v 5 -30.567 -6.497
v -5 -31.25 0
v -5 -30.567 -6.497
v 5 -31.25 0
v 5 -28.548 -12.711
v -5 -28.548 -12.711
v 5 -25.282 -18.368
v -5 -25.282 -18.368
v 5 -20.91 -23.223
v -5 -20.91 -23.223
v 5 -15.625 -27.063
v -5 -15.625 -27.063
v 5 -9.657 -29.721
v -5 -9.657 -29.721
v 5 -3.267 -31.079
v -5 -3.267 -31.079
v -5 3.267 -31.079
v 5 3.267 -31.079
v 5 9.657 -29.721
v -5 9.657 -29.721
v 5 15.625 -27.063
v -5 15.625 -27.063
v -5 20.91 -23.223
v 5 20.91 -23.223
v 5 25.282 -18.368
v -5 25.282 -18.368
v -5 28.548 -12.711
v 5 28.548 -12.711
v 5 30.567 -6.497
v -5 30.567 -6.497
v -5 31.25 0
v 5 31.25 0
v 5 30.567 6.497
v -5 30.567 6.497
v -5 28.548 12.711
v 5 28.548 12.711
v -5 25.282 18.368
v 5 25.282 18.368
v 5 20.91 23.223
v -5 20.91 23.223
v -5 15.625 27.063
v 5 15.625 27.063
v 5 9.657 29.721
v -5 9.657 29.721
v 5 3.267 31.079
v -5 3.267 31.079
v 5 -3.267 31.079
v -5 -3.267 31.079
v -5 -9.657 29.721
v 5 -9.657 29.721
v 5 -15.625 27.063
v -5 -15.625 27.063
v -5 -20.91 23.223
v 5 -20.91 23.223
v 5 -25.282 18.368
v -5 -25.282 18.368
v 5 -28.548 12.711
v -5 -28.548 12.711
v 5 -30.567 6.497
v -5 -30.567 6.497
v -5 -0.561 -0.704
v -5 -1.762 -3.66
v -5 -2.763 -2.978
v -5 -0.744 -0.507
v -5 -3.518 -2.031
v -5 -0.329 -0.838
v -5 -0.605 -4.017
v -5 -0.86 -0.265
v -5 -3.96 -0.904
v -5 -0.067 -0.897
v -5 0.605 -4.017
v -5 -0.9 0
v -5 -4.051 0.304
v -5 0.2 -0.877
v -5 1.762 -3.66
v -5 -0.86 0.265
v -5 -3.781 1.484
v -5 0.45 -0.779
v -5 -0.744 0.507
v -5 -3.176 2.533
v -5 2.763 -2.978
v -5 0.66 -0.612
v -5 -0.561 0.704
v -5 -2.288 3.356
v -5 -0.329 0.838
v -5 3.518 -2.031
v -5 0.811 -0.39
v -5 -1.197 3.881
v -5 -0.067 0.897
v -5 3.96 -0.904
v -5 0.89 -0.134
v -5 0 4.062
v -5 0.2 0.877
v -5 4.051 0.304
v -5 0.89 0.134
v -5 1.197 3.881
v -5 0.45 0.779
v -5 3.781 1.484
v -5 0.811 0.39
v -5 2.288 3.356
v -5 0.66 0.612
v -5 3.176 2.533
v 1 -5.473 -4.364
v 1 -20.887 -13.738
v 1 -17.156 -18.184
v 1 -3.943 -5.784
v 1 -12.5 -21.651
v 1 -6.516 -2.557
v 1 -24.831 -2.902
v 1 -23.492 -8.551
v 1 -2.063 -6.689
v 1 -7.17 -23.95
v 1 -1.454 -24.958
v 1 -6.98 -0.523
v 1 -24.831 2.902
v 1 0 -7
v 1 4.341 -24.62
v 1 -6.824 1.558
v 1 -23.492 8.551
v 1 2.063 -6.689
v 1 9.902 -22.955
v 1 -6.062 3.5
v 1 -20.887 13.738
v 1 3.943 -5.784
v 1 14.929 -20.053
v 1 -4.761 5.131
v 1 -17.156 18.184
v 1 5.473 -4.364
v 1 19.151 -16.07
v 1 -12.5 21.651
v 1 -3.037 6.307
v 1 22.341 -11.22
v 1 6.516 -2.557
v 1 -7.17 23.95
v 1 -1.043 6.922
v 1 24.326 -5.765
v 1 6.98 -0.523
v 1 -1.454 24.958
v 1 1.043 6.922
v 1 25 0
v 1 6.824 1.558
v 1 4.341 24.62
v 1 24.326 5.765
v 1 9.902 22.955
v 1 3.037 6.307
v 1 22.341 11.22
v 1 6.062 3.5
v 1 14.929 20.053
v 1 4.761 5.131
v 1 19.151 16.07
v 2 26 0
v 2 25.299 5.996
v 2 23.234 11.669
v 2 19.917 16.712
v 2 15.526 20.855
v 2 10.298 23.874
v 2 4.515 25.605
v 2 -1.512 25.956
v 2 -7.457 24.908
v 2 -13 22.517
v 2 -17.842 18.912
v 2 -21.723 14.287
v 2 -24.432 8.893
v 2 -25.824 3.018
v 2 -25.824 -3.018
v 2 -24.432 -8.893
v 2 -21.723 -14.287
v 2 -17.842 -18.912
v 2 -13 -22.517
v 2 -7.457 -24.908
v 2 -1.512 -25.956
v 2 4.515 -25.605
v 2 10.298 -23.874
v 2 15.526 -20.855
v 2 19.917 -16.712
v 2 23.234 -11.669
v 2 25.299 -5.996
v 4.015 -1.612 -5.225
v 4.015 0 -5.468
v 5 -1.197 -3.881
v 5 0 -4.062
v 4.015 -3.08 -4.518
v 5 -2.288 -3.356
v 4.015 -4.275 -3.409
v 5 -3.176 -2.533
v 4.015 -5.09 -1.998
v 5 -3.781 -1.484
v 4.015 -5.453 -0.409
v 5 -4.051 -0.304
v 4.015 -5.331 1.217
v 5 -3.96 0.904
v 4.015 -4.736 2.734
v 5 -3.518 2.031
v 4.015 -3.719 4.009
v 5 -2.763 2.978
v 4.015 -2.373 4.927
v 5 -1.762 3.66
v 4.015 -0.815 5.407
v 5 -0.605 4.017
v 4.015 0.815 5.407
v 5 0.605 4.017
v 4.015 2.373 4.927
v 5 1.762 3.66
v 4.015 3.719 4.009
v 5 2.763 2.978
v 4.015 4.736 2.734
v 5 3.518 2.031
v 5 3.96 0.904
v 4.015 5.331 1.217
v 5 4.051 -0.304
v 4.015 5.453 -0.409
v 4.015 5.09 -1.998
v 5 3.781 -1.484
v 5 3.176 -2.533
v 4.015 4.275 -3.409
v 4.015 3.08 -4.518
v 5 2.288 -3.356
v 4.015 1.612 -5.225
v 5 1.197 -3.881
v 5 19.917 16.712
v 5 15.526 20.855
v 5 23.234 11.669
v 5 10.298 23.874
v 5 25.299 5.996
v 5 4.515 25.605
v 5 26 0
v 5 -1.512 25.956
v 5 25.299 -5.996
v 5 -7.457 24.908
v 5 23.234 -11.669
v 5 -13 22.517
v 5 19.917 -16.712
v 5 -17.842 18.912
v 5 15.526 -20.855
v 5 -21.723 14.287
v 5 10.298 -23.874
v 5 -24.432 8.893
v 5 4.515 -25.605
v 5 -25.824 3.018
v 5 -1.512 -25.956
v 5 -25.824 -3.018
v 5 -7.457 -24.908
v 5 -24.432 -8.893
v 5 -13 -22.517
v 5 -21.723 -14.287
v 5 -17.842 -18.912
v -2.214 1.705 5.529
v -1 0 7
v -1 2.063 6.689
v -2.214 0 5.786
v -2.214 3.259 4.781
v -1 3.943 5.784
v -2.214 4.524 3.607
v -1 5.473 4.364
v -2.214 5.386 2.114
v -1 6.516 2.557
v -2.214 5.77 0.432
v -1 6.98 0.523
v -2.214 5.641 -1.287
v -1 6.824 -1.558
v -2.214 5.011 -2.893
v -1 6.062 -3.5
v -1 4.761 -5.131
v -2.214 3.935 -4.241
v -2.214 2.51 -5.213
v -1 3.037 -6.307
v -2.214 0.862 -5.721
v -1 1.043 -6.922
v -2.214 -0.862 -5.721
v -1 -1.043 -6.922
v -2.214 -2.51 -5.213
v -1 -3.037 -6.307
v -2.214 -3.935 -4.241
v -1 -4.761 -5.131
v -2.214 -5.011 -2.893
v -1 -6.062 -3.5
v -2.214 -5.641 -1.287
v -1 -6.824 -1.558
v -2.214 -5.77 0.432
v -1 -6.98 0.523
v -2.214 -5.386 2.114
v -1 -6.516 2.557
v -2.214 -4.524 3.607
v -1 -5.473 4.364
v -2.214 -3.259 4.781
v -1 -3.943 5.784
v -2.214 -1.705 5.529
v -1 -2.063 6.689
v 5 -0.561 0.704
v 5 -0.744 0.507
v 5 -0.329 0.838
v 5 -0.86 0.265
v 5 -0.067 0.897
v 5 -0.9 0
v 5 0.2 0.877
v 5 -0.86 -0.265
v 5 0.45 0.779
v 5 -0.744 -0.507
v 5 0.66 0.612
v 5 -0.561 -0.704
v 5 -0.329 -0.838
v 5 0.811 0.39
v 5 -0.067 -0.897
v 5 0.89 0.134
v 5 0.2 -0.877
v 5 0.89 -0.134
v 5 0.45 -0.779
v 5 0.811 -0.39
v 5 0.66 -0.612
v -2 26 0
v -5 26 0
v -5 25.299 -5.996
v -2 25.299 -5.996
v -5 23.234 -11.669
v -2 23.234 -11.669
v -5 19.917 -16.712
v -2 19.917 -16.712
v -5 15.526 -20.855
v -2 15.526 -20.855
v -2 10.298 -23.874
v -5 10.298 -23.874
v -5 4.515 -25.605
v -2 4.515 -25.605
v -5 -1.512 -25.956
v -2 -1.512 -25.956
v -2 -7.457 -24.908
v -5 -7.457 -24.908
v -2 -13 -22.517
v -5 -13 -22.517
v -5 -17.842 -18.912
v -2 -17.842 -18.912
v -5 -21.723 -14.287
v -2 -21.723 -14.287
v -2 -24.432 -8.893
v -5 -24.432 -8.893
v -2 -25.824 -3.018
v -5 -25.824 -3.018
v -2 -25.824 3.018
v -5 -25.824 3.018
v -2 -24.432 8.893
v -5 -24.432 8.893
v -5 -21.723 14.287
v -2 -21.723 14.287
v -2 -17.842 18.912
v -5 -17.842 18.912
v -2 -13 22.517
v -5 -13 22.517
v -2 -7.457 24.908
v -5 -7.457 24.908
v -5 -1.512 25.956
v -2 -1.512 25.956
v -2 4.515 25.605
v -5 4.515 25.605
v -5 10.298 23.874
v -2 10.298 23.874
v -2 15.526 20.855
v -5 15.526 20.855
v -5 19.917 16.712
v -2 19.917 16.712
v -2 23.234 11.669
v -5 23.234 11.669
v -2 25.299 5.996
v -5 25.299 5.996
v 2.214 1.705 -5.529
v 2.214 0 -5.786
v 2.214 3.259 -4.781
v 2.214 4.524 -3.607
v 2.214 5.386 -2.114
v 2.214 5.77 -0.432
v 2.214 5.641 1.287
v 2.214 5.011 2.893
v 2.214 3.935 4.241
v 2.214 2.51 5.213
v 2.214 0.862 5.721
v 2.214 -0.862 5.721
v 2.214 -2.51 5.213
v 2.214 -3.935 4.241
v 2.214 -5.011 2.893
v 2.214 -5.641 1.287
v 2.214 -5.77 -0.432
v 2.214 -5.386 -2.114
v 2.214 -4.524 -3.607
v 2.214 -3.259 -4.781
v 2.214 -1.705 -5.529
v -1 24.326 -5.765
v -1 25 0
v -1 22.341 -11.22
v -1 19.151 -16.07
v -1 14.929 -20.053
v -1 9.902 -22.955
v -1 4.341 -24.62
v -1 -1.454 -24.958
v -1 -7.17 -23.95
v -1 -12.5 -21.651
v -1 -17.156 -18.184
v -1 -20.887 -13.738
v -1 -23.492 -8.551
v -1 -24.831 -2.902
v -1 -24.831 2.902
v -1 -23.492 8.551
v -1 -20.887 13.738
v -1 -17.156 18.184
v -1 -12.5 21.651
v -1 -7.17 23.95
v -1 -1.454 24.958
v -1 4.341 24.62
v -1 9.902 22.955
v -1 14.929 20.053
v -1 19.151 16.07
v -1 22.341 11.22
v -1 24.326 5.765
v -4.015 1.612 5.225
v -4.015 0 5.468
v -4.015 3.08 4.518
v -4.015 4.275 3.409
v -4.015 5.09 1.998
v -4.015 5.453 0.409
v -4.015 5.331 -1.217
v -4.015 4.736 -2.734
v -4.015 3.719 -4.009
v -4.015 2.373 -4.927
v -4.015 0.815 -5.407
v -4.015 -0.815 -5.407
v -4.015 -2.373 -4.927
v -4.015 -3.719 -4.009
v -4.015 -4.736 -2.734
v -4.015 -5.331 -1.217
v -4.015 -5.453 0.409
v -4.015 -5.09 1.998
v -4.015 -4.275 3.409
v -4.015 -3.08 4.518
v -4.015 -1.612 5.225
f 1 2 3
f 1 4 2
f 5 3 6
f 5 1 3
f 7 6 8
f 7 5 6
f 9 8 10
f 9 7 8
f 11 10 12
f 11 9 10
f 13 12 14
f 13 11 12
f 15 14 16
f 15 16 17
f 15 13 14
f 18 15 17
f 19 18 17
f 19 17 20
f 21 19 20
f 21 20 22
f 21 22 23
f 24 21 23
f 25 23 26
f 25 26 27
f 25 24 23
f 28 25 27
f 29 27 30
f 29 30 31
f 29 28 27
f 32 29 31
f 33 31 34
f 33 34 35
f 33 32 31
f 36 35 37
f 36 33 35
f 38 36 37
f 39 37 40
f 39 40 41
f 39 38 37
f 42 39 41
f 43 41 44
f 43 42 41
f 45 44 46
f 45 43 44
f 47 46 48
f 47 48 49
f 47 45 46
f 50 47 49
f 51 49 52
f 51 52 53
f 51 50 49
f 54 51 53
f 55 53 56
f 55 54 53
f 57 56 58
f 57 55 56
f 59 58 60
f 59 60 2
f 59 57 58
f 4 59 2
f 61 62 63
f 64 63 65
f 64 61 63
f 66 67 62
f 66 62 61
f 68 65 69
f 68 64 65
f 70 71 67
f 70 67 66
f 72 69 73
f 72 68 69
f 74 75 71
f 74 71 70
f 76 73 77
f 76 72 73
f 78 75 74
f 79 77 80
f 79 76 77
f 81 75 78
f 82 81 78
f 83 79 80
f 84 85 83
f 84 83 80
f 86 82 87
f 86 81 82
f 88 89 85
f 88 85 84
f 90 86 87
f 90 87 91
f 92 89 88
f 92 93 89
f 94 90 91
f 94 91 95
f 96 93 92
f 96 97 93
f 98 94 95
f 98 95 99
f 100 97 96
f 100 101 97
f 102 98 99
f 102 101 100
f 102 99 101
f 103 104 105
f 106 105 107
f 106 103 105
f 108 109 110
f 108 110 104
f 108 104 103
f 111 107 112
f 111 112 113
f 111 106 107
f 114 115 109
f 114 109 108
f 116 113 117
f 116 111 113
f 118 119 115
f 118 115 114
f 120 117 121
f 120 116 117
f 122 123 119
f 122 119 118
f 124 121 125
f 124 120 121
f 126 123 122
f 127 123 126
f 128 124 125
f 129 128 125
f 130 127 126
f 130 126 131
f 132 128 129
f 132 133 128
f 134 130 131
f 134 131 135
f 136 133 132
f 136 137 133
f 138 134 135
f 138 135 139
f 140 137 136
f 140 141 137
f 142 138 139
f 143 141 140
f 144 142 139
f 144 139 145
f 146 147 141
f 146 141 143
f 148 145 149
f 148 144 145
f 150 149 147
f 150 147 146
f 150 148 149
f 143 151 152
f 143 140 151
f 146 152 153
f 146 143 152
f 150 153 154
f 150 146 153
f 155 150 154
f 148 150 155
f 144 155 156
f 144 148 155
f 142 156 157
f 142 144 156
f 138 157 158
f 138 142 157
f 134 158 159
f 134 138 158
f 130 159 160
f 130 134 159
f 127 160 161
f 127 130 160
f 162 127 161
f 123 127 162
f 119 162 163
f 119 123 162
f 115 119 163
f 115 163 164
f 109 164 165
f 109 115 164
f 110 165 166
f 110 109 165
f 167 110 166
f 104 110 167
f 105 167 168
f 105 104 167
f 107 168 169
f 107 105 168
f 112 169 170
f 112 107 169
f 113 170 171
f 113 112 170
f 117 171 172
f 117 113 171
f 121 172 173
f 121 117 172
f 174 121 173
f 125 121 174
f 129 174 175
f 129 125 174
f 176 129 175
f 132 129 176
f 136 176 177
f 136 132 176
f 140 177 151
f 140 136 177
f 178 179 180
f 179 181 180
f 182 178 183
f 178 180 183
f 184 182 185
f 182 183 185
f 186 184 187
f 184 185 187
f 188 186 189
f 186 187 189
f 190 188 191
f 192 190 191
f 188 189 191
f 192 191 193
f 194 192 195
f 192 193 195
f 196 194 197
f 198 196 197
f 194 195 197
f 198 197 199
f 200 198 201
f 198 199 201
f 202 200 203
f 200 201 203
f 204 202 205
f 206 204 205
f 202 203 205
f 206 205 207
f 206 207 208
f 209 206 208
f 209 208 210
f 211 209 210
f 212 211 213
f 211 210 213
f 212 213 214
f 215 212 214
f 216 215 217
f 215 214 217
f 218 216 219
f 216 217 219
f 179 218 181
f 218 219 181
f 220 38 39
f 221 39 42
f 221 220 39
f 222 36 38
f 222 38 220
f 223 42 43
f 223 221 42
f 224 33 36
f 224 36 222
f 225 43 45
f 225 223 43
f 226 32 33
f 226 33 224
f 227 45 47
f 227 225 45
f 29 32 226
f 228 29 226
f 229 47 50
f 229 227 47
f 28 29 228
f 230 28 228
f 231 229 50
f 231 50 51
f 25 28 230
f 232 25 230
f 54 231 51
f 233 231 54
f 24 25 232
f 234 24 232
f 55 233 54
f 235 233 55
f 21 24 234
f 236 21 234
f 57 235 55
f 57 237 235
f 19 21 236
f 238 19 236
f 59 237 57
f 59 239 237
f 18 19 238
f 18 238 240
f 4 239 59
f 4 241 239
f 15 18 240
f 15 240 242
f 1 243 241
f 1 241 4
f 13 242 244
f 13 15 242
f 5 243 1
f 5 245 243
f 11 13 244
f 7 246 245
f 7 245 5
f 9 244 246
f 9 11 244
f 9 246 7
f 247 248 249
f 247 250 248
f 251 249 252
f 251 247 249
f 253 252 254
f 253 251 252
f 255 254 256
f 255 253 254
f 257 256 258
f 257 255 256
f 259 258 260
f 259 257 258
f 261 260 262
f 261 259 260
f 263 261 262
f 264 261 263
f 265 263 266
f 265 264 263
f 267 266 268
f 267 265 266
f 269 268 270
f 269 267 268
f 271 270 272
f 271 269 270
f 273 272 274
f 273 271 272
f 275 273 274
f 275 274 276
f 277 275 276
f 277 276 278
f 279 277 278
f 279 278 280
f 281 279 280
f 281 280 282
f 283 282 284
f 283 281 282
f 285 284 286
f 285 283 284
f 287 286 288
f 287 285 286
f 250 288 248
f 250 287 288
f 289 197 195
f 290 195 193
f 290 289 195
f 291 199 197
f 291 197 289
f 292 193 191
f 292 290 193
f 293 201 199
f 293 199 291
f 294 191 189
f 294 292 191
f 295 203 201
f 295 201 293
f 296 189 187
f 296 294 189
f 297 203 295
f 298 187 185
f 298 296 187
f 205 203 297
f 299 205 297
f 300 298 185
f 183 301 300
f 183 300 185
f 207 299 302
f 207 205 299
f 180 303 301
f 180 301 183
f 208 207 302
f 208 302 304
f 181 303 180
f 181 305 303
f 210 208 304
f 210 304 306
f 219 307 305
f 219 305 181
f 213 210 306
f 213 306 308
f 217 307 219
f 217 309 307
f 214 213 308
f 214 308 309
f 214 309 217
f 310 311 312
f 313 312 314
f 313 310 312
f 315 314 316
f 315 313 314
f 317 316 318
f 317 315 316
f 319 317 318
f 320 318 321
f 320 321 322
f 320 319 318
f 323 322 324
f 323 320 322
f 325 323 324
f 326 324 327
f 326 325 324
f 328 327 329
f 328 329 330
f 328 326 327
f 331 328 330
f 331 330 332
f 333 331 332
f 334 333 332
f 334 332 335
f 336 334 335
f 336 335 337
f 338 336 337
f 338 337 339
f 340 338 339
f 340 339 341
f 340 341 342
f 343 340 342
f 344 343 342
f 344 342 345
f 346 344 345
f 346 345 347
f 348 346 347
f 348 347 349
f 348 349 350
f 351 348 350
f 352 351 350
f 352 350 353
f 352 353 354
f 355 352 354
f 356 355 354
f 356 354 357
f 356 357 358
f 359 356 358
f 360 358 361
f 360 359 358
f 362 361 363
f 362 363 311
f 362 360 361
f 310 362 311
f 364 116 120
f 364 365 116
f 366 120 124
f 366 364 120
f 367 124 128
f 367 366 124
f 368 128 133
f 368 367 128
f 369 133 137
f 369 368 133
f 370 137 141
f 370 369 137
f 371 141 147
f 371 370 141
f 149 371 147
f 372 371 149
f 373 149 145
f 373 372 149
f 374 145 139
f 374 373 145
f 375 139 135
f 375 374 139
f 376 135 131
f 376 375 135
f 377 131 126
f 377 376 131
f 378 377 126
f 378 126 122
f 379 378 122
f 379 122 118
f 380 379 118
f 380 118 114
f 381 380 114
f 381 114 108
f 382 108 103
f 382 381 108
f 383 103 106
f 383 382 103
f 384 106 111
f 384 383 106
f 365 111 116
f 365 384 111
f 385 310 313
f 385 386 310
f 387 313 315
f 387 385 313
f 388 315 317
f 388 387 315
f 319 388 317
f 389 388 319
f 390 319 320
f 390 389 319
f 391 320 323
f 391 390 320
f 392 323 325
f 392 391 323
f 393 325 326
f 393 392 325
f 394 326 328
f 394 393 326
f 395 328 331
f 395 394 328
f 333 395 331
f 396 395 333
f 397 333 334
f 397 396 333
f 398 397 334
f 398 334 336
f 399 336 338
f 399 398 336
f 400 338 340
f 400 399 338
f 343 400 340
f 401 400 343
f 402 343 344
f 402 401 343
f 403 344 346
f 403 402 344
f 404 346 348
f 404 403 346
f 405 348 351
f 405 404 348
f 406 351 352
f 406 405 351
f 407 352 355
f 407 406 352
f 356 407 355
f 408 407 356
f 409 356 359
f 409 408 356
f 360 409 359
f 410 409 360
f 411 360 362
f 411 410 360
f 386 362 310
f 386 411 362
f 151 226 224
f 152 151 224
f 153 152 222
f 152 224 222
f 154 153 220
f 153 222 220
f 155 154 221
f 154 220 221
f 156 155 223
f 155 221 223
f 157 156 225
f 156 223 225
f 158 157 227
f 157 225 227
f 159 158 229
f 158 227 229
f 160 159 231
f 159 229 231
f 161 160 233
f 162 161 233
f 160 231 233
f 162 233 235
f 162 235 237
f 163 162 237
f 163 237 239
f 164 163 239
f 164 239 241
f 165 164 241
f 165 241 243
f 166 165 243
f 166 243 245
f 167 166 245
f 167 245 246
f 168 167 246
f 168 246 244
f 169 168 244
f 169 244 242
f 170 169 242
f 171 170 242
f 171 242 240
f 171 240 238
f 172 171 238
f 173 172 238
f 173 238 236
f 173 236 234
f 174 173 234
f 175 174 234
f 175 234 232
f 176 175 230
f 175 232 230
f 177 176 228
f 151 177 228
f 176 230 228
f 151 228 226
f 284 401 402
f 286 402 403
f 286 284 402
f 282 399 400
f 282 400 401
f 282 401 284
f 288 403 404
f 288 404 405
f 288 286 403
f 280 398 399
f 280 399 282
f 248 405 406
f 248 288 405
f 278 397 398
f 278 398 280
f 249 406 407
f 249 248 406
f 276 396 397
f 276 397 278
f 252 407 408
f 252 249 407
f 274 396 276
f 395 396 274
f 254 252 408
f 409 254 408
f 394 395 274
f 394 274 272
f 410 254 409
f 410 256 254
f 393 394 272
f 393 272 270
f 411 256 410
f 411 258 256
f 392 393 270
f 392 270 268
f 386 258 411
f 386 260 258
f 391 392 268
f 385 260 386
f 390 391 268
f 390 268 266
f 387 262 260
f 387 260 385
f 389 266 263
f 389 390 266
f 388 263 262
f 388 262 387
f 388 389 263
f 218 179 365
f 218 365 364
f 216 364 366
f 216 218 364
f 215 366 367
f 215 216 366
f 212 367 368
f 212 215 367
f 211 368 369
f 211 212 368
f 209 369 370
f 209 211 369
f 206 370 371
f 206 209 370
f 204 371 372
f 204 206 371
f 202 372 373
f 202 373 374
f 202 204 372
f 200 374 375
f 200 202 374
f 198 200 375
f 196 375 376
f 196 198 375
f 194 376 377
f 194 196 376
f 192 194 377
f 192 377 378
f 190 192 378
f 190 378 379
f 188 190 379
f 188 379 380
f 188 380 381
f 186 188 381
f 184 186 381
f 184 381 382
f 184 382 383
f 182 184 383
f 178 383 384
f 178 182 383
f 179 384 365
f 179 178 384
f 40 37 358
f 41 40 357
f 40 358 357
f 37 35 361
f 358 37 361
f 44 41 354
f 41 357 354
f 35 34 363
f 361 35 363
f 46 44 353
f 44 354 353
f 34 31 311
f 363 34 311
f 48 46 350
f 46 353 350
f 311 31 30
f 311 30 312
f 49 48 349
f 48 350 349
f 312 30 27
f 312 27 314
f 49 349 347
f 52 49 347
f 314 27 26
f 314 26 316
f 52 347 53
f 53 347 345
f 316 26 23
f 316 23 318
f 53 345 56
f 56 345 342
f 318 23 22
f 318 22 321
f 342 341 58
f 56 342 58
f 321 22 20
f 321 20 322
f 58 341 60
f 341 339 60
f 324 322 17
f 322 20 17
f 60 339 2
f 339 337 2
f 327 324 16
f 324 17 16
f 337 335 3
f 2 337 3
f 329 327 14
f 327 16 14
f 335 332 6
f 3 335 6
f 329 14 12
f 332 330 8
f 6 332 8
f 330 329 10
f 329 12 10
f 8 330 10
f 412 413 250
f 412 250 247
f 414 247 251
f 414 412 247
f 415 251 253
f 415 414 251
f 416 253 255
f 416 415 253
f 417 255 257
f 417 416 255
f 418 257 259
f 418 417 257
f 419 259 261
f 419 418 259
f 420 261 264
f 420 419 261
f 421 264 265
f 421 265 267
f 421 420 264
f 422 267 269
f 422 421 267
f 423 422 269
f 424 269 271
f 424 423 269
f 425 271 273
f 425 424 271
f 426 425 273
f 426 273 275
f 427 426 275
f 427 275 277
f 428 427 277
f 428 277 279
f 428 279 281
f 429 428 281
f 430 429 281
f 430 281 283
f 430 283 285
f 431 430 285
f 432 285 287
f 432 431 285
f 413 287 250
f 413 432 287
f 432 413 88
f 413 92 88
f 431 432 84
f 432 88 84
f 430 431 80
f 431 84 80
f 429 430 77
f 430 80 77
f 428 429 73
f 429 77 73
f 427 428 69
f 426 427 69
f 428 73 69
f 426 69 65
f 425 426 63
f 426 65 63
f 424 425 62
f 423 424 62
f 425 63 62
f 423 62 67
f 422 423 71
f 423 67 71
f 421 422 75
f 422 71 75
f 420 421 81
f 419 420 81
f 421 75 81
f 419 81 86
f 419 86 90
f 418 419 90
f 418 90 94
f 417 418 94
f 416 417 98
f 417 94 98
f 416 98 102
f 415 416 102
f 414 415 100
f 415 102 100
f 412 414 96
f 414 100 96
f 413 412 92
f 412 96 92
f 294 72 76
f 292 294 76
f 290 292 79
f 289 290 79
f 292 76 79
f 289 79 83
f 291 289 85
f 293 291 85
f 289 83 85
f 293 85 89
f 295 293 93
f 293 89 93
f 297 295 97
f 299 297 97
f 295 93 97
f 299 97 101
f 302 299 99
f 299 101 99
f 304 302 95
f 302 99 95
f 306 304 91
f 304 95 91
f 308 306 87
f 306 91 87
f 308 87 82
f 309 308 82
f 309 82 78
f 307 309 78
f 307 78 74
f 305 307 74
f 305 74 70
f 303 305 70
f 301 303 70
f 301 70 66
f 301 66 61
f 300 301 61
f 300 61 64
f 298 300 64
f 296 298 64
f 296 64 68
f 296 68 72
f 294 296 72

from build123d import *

# Parameters (mm, degrees)
SKETCH1_W           = 10
SKETCH1_H           = 31.25
SKETCH2_R           = 26
CUT_EXTRUDE1_DEPTH  = 4
SKETCH3_R           = 6
BOSS_EXTRUDE1_DEPTH = 4
BOSS_EXTRUDE1_TAPER = 10
CUT_EXTRUDE2_START  = -4
SKETCH4_R           = 26
CUT_EXTRUDE2_DEPTH  = 4
SKETCH5_R           = 6
BOSS_EXTRUDE2_DEPTH = 4
BOSS_EXTRUDE2_TAPER = 10
CHAMFER1_SIZE       = 1
CHAMFER1_SIZE_2     = 1.232803052
SKETCH6_R           = 0.9
CUT_EXTRUDE3_DEPTH  = 46.311422401


with BuildPart() as part:
    # Sketch1 → Revolve1 (revolve)
    with BuildSketch(Plane.XY):
        with Locations((0, -15.625)):
            Rectangle(SKETCH1_W, SKETCH1_H)
    revolve(axis=Axis((-5, 0, 0), (1, 0, 0)))

    # Sketch2 → Cut-Extrude1 (cut)
    with BuildSketch(Plane(origin=(5, 0, 0), x_dir=(0, 0, -1), z_dir=(1, 0, 0))):
        with Locations(Location((0, 0, 0), (0, 0, 90))):
            Circle(SKETCH2_R)
    extrude(amount=-CUT_EXTRUDE1_DEPTH, mode=Mode.SUBTRACT)

    # Sketch3 → Boss-Extrude1 (add)
    with BuildSketch(Plane(origin=(1, 0, 0), x_dir=(0, 0, -1), z_dir=(1, 0, 0))):
        Circle(SKETCH3_R)
    extrude(amount=BOSS_EXTRUDE1_DEPTH, taper=BOSS_EXTRUDE1_TAPER)

    # Sketch4 → Cut-Extrude2 (cut)
    with BuildSketch(Plane.ZY.offset(5).offset(CUT_EXTRUDE2_START)):
        with Locations(Location((0, 0, 0), (0, 0, 90))):
            Circle(SKETCH4_R)
    extrude(amount=CUT_EXTRUDE2_DEPTH, mode=Mode.SUBTRACT)

    # Sketch5 → Boss-Extrude2 (add)
    with BuildSketch(Plane.ZY.offset(1)):
        Circle(SKETCH5_R)
    extrude(amount=BOSS_EXTRUDE2_DEPTH, taper=BOSS_EXTRUDE2_TAPER)

    # Chamfer1
    # the kernel refuses this chamfer: 1.232803052, 1 mm, written as the material it adds along each edge
    with BuildSketch(Plane(origin=(1, 0, 0), x_dir=(0, 0, -1), z_dir=(0, -1, 0))) as chamfer1_piece_1:
        Polygon((6 + CHAMFER1_SIZE, 0), (6 - CHAMFER1_SIZE_2 * 0.173648177642, CHAMFER1_SIZE_2 * 0.98480775287), (6, 0), align=None)
    revolve(axis=Axis((1, 0, 0), (1, 0, 0)))
    with BuildSketch(Plane(origin=(-1, 0, 0), x_dir=(0, 1, 0), z_dir=(0, 0, 1))) as chamfer1_piece_2:
        Polygon((26, CHAMFER1_SIZE), (26 - CHAMFER1_SIZE, 0), (26, 0), align=None)
    revolve(axis=Axis((-1, 0, 0), (-1, 0, 0)))
    with BuildSketch(Plane(origin=(1, 0, 0), x_dir=(0, 1, 0), z_dir=(0, 0, -1))) as chamfer1_piece_3:
        Polygon((26, CHAMFER1_SIZE), (26 - CHAMFER1_SIZE, 0), (26, 0), align=None)
    revolve(axis=Axis((1, 0, 0), (1, 0, 0)))
    with BuildSketch(Plane(origin=(-1, 0, 0), x_dir=(0, 0, 1), z_dir=(0, -1, 0))) as chamfer1_piece_4:
        Polygon((6 + CHAMFER1_SIZE, 0), (6 - CHAMFER1_SIZE_2 * 0.173648177642, CHAMFER1_SIZE_2 * 0.98480775287), (6, 0), align=None)
    revolve(axis=Axis((-1, 0, 0), (-1, 0, 0)))
    # the kernel refuses this chamfer: 1.232803052, 1 mm, written as the material it takes off along each edge
    with BuildSketch(Plane(origin=(5, 0, 0), x_dir=(0, 0, -1), z_dir=(0, 1, 0))) as chamfer1_2_piece_1:
        Polygon((5.294692077 + CHAMFER1_SIZE * 0.173648177667, CHAMFER1_SIZE * 0.984807753012), (5.294692077 - CHAMFER1_SIZE_2, 0), (5.294692077, 0), align=None)
    revolve(axis=Axis((5, 0, 0), (-1, 0, 0)), mode=Mode.SUBTRACT)
    with BuildSketch(Plane(origin=(-5, 0, 0), x_dir=(0, 0, 1), z_dir=(0, 1, 0))) as chamfer1_2_piece_2:
        Polygon((5.294692077 + CHAMFER1_SIZE * 0.173648177667, CHAMFER1_SIZE * 0.984807753012), (5.294692077 - CHAMFER1_SIZE_2, 0), (5.294692077, 0), align=None)
    revolve(axis=Axis((-5, 0, 0), (1, 0, 0)), mode=Mode.SUBTRACT)

    # Sketch6 → Cut-Extrude3 (cut, through all)
    with BuildSketch(Plane.ZY.offset(5)):
        with Locations(Location((0, 0, 0), (0, 0, 270))):
            Circle(SKETCH6_R)
    extrude(amount=-CUT_EXTRUDE3_DEPTH, mode=Mode.SUBTRACT)


solid = part.part
